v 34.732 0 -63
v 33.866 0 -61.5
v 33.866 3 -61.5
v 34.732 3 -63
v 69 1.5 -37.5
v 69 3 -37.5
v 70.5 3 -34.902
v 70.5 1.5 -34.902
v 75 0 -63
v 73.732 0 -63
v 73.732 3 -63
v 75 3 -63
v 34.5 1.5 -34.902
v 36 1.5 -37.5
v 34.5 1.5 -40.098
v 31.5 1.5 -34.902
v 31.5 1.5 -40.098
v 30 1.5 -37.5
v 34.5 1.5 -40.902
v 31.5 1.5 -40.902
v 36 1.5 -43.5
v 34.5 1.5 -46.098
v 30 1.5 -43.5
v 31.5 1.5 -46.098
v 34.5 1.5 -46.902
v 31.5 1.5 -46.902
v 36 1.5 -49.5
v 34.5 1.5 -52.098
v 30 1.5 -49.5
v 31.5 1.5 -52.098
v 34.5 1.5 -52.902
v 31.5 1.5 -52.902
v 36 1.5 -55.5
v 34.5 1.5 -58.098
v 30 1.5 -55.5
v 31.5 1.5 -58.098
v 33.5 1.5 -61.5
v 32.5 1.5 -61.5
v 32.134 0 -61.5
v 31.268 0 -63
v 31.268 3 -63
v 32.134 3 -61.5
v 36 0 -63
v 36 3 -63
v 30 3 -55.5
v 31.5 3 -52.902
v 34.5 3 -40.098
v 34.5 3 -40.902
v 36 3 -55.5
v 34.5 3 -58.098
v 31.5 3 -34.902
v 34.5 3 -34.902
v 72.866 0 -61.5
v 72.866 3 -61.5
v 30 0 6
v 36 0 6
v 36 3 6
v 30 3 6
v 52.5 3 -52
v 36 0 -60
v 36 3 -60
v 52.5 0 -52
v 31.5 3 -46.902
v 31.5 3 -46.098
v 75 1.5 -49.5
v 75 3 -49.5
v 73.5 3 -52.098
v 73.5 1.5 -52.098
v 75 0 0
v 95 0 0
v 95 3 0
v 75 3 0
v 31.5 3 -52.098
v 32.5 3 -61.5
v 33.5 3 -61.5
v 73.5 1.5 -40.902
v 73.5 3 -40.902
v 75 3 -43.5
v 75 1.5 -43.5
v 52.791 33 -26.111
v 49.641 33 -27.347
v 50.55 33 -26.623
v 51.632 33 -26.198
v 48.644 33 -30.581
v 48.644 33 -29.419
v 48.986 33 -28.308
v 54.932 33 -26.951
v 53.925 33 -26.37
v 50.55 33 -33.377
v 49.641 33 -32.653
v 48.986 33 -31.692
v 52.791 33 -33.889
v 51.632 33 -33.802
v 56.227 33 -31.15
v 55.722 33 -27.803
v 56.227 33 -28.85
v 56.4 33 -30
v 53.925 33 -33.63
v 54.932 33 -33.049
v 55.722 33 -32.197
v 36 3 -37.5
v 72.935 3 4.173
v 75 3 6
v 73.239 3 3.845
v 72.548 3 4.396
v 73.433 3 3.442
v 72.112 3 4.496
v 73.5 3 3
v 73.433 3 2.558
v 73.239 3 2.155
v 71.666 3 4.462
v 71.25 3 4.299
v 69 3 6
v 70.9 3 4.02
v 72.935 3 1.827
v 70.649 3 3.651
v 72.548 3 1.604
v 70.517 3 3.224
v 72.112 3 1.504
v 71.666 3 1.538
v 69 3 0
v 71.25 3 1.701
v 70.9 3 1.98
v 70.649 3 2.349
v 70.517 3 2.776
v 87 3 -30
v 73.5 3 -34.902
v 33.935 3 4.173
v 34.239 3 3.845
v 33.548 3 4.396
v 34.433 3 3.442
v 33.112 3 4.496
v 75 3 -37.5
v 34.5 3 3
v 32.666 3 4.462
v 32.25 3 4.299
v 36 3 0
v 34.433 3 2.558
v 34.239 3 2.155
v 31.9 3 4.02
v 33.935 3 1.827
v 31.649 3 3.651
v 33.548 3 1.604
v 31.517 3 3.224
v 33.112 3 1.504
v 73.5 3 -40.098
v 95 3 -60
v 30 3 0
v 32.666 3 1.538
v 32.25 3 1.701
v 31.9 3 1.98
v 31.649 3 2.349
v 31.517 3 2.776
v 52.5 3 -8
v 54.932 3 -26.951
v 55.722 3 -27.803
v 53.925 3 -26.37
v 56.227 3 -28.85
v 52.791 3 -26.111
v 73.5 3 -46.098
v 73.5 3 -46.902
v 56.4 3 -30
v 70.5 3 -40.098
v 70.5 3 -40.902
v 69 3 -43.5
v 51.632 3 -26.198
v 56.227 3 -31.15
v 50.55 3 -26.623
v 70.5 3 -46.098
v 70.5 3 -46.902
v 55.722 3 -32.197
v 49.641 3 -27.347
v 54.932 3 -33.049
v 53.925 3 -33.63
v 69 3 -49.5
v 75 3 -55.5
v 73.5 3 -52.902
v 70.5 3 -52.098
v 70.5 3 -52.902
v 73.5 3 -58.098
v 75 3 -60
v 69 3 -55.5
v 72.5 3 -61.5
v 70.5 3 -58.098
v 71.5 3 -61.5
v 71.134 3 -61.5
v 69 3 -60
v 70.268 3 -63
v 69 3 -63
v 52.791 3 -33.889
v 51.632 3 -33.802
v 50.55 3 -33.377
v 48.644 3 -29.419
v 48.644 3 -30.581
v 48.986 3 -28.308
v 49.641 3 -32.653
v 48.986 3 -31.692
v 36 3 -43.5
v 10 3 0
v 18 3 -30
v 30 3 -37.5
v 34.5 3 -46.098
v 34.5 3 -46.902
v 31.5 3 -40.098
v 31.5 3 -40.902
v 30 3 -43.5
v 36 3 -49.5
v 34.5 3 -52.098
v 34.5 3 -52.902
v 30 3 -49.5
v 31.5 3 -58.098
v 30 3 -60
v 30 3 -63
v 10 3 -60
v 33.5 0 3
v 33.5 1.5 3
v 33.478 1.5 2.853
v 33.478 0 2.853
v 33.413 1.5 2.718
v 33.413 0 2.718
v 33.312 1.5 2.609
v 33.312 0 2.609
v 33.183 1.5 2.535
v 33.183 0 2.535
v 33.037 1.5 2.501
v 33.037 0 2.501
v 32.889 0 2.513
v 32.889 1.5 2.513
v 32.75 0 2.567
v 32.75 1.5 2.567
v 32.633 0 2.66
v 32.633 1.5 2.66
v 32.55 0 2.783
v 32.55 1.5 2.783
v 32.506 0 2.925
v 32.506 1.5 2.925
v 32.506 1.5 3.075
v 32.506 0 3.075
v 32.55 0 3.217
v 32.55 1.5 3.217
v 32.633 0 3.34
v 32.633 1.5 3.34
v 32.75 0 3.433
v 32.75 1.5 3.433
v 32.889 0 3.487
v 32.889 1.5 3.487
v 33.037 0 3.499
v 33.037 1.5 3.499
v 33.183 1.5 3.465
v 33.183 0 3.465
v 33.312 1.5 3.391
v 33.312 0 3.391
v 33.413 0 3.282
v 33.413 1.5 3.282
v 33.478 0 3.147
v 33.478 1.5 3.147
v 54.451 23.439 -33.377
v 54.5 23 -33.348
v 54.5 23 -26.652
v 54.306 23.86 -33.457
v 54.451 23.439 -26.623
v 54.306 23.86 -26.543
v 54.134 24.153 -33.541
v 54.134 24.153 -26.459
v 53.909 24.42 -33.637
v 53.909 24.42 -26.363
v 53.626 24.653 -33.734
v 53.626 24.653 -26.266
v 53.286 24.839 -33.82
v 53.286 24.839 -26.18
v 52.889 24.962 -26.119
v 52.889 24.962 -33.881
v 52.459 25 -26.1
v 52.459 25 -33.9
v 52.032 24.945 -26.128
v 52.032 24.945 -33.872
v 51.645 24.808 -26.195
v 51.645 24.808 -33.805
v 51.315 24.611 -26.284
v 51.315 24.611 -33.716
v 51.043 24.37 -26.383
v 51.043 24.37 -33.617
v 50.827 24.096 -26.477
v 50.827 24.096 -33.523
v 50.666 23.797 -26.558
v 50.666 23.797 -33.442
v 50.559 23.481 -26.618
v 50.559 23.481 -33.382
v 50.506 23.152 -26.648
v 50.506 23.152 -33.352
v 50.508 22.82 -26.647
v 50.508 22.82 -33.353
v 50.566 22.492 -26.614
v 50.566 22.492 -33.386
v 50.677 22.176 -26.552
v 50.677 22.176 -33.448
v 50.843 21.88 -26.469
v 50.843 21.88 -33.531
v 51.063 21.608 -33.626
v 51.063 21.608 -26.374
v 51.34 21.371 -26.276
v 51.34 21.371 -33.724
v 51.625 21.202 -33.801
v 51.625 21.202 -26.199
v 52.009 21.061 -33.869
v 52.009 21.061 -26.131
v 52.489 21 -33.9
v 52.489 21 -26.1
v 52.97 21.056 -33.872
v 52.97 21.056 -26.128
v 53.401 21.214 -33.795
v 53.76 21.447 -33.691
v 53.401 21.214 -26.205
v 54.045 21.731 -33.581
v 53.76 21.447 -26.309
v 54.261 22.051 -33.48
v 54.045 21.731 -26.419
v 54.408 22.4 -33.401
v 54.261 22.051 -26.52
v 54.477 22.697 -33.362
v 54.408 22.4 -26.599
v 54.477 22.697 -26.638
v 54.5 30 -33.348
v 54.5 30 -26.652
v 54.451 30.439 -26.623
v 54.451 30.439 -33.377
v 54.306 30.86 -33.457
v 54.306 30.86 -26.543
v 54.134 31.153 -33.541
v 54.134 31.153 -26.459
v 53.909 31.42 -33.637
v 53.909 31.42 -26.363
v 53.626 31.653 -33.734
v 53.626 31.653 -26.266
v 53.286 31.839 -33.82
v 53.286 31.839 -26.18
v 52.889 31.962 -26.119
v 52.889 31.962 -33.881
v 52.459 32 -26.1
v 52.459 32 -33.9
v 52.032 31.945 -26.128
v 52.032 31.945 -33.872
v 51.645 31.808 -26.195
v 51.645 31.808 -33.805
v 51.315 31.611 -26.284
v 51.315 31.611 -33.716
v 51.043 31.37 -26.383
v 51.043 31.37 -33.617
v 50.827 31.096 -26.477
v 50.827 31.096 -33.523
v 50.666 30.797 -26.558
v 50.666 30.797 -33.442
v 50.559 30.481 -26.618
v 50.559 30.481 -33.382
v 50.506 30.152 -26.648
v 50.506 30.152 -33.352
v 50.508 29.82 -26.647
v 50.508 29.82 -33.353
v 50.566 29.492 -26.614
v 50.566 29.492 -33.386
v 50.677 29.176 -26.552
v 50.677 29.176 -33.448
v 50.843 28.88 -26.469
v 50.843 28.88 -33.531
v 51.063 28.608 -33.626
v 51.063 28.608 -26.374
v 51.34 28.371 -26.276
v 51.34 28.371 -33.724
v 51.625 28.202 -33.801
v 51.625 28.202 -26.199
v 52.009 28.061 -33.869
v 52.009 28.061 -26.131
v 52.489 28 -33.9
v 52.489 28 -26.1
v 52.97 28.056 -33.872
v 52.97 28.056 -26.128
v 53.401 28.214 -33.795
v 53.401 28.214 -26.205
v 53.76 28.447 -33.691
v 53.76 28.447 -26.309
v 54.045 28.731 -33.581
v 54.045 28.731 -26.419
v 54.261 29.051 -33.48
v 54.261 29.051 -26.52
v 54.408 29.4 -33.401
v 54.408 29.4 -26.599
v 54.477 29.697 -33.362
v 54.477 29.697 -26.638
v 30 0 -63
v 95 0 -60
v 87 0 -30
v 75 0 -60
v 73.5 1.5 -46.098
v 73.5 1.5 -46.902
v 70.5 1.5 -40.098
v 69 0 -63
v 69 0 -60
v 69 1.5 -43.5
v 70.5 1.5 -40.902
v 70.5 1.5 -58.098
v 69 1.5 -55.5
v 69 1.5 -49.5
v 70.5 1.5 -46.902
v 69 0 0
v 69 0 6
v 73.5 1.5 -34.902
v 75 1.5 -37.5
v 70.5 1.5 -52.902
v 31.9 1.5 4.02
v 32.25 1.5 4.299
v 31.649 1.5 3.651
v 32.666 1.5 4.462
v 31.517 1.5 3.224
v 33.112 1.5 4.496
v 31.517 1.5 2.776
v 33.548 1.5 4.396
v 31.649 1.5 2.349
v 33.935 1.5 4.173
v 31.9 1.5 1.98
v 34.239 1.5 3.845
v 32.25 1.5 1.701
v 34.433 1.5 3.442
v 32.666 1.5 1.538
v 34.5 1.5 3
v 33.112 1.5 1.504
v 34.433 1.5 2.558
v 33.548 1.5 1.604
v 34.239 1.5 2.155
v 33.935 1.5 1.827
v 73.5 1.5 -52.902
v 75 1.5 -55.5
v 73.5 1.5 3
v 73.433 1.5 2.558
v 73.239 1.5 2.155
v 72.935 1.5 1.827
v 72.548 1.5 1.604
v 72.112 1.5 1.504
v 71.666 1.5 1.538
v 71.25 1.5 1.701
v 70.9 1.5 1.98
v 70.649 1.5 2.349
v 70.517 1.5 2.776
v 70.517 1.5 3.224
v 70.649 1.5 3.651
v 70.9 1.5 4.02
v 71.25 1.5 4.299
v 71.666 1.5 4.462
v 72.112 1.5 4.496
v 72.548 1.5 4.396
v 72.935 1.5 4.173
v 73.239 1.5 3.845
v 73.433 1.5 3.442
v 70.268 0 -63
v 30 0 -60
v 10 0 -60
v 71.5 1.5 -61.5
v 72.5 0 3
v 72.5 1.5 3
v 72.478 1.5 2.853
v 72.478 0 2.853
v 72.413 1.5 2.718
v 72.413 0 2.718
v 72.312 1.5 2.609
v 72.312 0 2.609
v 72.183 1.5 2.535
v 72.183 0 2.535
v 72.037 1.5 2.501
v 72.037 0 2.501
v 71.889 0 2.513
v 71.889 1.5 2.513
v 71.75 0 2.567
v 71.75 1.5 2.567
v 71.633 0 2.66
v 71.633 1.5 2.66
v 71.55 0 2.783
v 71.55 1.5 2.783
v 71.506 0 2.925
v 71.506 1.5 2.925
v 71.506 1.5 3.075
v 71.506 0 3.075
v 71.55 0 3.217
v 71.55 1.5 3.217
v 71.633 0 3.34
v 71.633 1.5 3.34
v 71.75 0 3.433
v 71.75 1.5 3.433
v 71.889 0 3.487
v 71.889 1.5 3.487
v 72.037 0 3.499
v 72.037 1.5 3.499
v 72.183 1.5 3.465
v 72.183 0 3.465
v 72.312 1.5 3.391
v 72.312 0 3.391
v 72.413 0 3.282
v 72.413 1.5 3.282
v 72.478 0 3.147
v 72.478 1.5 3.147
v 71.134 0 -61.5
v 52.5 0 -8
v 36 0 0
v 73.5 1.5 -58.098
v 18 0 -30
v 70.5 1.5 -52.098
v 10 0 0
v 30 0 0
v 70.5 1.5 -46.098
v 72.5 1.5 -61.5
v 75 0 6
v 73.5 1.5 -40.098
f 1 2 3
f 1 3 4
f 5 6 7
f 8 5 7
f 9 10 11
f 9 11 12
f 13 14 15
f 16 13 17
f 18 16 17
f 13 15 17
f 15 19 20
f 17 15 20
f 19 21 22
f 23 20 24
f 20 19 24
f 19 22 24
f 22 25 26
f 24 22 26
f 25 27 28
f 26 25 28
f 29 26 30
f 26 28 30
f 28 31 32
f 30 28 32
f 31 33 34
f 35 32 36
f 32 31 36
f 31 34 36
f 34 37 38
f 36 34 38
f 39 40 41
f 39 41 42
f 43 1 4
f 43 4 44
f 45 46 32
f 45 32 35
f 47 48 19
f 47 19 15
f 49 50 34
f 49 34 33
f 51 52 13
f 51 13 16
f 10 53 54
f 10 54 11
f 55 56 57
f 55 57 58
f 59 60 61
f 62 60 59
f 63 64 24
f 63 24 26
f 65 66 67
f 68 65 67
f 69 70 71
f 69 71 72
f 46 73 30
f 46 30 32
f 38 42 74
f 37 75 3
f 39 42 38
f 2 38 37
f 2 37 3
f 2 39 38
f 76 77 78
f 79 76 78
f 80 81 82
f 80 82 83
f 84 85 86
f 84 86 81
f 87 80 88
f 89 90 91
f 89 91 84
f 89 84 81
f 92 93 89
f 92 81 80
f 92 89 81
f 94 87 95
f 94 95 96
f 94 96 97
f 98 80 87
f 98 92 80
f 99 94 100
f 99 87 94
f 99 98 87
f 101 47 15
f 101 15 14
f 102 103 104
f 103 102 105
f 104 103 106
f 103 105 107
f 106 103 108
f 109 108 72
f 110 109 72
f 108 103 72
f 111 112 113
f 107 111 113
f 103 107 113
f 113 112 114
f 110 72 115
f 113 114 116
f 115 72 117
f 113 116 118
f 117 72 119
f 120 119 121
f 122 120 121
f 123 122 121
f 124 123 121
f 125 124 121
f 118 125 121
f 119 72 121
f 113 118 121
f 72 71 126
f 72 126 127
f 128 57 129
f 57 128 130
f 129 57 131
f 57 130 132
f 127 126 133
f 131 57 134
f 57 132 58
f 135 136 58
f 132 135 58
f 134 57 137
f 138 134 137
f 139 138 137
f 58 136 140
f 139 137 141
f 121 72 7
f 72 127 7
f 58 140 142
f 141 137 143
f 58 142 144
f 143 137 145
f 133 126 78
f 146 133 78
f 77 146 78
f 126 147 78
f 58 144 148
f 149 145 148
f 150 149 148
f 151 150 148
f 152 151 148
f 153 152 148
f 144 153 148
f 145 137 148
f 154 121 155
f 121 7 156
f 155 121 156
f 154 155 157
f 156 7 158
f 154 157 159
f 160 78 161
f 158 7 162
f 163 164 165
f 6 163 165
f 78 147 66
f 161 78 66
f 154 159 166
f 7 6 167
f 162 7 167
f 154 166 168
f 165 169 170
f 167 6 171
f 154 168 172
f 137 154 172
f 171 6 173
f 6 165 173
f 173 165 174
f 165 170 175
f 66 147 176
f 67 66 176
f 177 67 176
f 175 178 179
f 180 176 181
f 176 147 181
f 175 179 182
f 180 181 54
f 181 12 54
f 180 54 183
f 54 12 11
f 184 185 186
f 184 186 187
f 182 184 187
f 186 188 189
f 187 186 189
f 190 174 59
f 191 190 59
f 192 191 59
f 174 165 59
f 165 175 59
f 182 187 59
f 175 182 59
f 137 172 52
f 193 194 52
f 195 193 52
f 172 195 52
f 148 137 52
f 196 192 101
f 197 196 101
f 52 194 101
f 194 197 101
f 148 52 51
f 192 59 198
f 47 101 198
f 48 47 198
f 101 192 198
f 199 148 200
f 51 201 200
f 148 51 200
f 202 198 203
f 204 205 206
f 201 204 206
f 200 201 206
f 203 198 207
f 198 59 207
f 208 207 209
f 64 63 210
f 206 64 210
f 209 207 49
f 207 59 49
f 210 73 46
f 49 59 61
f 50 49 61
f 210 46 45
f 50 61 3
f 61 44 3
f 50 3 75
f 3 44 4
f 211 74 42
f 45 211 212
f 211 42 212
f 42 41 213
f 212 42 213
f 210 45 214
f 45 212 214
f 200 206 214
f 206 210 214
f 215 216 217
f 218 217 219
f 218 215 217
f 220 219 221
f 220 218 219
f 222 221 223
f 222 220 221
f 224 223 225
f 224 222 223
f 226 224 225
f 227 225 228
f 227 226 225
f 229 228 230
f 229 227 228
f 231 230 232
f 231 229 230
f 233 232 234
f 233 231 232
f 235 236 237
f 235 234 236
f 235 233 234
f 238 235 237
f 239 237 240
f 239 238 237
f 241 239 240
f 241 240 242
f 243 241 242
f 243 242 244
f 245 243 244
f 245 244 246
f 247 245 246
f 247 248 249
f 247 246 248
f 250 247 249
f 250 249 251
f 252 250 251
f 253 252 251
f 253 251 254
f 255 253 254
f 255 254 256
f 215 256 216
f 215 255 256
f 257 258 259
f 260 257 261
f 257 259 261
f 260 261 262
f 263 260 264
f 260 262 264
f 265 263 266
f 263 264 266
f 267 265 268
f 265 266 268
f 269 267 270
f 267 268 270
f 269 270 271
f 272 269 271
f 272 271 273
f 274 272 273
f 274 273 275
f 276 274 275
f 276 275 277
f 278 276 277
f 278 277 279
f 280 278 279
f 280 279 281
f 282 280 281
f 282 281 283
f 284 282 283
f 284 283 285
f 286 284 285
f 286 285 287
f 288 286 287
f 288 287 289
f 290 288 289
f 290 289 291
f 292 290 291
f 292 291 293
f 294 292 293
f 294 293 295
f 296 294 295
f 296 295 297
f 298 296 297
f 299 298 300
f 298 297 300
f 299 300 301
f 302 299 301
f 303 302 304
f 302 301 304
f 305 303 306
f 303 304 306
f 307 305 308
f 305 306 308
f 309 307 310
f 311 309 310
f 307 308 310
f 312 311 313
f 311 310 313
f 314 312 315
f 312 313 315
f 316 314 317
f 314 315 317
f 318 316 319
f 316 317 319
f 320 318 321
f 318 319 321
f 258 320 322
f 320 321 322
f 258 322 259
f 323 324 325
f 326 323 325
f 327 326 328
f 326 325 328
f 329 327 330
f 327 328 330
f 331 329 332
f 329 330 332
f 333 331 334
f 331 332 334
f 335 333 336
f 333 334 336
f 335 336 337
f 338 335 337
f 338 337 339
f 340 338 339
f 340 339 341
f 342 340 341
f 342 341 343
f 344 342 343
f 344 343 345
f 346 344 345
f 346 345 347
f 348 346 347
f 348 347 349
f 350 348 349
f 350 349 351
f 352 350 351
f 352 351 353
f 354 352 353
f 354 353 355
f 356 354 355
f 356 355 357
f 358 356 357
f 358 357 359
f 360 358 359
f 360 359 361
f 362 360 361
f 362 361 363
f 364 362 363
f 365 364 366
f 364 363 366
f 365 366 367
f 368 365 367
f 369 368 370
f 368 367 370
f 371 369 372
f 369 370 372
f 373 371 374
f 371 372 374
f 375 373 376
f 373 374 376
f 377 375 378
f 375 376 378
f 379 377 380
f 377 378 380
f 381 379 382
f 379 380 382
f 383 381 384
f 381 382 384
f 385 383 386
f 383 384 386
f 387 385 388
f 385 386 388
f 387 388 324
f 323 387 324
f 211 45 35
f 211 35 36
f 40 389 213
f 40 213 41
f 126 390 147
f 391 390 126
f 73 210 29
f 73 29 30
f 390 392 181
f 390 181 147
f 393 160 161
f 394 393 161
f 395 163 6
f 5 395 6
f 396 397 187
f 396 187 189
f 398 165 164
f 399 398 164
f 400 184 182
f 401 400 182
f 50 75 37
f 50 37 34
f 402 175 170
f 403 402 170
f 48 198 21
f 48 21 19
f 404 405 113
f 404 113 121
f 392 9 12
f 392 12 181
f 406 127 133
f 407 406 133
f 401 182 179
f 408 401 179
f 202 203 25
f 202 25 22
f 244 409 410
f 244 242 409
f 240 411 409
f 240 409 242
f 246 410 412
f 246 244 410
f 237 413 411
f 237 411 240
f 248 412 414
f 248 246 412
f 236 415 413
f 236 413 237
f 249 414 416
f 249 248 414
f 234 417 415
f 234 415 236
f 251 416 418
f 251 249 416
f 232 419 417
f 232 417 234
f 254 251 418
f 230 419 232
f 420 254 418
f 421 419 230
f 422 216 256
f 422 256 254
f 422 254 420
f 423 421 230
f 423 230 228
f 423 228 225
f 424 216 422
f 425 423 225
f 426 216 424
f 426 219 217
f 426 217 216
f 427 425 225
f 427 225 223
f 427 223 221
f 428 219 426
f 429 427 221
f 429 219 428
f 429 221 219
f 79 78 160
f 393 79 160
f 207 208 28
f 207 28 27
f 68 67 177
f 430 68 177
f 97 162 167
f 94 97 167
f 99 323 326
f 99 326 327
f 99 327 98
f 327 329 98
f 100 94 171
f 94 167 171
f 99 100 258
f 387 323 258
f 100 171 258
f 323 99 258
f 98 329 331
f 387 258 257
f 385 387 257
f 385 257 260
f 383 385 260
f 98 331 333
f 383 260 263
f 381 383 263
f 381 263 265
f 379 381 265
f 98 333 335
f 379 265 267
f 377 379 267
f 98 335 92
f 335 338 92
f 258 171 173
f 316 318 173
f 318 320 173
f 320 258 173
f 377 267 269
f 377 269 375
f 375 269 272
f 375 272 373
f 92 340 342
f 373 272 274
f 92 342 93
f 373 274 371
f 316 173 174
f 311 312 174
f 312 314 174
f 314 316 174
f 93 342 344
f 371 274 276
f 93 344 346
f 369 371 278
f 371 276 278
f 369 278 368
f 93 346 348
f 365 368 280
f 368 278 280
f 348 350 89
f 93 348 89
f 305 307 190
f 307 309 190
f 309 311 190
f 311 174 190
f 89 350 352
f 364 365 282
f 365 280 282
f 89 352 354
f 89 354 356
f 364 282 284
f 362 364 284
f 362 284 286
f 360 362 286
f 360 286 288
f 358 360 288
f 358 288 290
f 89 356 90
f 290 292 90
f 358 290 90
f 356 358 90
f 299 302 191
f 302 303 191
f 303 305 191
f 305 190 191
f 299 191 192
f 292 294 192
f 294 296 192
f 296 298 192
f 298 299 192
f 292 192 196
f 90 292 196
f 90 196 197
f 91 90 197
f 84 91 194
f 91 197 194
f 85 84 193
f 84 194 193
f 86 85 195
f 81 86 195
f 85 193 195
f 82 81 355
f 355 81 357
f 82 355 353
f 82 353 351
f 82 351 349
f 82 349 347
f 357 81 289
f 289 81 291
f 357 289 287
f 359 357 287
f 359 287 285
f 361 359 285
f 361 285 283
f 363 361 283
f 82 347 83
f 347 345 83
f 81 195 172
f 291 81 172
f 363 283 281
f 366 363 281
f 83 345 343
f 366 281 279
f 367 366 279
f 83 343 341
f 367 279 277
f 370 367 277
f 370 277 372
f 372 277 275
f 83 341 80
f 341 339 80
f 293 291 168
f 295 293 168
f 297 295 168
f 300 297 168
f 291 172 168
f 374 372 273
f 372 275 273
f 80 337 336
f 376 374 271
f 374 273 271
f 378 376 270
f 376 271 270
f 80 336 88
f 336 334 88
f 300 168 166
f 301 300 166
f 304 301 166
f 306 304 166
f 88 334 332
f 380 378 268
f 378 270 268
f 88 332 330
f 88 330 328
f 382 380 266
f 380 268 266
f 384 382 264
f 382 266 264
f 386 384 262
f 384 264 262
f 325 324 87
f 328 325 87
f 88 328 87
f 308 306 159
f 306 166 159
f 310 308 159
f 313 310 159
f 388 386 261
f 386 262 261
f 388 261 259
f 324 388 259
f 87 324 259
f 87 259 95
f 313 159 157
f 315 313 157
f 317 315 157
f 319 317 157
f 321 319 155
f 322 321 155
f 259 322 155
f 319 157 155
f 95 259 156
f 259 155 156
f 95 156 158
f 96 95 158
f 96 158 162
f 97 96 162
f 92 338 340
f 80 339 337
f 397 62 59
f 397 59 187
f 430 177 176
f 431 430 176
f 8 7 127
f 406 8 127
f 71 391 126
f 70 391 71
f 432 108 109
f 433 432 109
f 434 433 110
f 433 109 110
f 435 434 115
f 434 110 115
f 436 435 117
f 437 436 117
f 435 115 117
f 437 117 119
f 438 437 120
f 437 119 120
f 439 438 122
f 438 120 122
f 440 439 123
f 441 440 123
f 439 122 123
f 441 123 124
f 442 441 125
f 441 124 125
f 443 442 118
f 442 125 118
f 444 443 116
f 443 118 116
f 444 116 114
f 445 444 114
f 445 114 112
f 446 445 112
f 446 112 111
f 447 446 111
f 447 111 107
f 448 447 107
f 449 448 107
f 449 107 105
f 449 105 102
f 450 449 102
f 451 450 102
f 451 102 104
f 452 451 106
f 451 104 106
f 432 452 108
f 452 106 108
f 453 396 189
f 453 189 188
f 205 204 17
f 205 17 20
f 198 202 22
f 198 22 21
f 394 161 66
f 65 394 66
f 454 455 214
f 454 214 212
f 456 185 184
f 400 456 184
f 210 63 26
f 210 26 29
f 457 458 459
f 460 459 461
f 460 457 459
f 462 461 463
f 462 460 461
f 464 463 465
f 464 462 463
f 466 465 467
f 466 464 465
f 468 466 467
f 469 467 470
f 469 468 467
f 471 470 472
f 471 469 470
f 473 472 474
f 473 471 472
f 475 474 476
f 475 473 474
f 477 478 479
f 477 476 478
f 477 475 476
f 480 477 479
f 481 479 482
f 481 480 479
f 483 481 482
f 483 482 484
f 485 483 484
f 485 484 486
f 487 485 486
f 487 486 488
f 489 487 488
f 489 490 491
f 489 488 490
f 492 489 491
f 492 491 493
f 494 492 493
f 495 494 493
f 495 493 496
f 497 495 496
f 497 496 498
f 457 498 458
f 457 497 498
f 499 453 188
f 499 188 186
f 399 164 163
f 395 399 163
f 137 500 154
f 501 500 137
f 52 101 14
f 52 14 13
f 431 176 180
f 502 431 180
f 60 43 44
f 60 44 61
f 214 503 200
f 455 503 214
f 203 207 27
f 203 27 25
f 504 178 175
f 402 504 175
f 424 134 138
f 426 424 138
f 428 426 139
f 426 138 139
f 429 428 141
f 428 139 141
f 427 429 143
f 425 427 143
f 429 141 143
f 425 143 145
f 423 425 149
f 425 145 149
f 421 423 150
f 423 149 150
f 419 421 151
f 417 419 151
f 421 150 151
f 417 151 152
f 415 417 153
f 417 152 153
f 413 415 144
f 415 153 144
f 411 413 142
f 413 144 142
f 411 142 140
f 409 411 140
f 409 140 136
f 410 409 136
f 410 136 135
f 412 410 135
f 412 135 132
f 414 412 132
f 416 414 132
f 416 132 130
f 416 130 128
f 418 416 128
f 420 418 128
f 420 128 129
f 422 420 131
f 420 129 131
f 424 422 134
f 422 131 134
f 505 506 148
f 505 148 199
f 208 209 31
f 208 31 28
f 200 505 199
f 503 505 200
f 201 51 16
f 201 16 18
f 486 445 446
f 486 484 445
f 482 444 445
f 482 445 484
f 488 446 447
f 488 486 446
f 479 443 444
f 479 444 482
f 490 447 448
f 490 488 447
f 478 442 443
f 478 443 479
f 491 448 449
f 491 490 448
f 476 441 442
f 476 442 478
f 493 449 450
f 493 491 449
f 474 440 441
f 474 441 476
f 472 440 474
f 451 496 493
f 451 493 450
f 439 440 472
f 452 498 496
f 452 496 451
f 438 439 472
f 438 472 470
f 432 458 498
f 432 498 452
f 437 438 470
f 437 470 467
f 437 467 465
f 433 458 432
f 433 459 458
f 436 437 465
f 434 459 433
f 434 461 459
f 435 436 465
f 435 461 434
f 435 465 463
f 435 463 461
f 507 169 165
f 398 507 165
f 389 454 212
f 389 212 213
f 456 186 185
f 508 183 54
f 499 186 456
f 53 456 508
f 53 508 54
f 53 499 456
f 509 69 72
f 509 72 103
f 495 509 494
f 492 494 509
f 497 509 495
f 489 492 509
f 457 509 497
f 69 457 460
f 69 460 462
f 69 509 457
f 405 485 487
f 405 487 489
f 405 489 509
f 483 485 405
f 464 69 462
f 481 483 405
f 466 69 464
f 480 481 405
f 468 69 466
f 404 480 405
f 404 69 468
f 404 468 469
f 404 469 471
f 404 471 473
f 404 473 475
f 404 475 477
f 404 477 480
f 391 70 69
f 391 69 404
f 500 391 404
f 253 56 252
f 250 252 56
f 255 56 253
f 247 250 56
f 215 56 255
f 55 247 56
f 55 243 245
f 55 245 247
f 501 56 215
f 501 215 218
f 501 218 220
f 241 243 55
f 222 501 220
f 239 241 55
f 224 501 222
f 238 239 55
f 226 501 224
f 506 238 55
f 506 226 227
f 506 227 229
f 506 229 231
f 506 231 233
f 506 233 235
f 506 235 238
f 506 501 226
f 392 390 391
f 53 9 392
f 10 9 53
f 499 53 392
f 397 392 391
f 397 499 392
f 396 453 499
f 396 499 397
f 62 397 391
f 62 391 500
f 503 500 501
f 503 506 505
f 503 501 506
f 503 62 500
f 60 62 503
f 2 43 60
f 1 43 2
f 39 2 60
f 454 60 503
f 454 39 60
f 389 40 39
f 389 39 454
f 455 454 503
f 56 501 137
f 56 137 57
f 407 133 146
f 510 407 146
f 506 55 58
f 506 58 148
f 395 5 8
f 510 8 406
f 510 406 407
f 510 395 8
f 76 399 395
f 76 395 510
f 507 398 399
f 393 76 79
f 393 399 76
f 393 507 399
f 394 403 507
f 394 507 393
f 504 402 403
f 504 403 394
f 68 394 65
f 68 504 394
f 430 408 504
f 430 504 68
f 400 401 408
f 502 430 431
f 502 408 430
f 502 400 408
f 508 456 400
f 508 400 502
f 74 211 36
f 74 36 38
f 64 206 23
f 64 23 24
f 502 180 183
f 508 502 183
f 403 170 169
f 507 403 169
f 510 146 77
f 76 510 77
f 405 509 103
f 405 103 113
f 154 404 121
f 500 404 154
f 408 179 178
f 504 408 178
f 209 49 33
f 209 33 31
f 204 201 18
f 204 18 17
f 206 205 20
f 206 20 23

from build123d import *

# Parameters (mm, degrees)
CROQUIS1_R              = 0.5
SALIENTE_EXTRUIR1_DEPTH = 3
CROQUIS2_R              = 3.9
SALIENTE_EXTRUIR2_DEPTH = 30
CROQUIS3_R              = 2
CORTAR_EXTRUIR1_DEPTH   = 64
CROQUIS4_R              = 1.5
CORTAR_EXTRUIR2_DEPTH   = 1.5
CORTAR_EXTRUIR3_DEPTH   = 1.5


with BuildPart() as part:
    # Croquis1 → Saliente-Extruir1 (new body)
    with BuildSketch(Plane(origin=(0, 0, 0), x_dir=(1, 0, 0), z_dir=(0, 1, 0))):
        Polygon((30, 60), (30, 63), (31.267949192, 63), (32.133974596, 61.5), (33.866025404, 61.5), (34.732050808, 63), (36, 63), (36, 60), (52.5, 52), (69, 60), (69, 63), (70.267949192, 63), (71.133974596, 61.5), (72.866025404, 61.5), (73.732050808, 63), (75, 63), (75, 60), (95, 60), (87, 30), (95, 0), (75, 0), (75, -6), (69, -6), (69, 0), (52.5, 8), (36, 0), (36, -6), (30, -6), (30, 0), (10, 0), (18, 30), (10, 60), align=None)
        with Locations((33, -3)):
            Circle(CROQUIS1_R, mode=Mode.SUBTRACT)
        with Locations((72, -3)):
            Circle(CROQUIS1_R, mode=Mode.SUBTRACT)
    extrude(amount=SALIENTE_EXTRUIR1_DEPTH)

    # Croquis2 → Saliente-Extruir2 (add)
    with BuildSketch(Plane(origin=(0, 3, 0), x_dir=(1, 0, 0), z_dir=(0, 1, 0))):
        with Locations((52.5, 30)):
            Circle(CROQUIS2_R)
    extrude(amount=SALIENTE_EXTRUIR2_DEPTH)

    # Croquis3 → Cortar-Extruir1 (cut, through all)
    with BuildSketch(Plane.XY):
        with Locations((52.5, 30)):
            Circle(CROQUIS3_R)
        with Locations((52.5, 23)):
            Circle(CROQUIS3_R)
    extrude(amount=-CORTAR_EXTRUIR1_DEPTH, mode=Mode.SUBTRACT)

    # Croquis4 → Cortar-Extruir2 (cut)
    with BuildSketch(Plane(origin=(0, 3, 0), x_dir=(1, 0, 0), z_dir=(0, 1, 0))):
        with Locations((33, -3)):
            Circle(CROQUIS4_R)
        with Locations((72, -3)):
            Circle(CROQUIS4_R)
    extrude(amount=-CORTAR_EXTRUIR2_DEPTH, mode=Mode.SUBTRACT)

    # Croquis5 → Cortar-Extruir3 (cut)
    with BuildSketch(Plane(origin=(0, 3, 0), x_dir=(1, 0, 0), z_dir=(0, 1, 0))):
        Polygon((32.5, 61.5), (33.5, 61.5), (34.5, 58.098076211), (36, 55.5), (34.5, 52.901923789), (34.5, 52.098076211), (36, 49.5), (34.5, 46.901923789), (34.5, 46.098076211), (36, 43.5), (34.5, 40.901923789), (34.5, 40.098076211), (36, 37.5), (34.5, 34.901923789), (31.5, 34.901923789), (30, 37.5), (31.5, 40.098076211), (31.5, 40.901923789), (30, 43.5), (31.5, 46.098076211), (31.5, 46.901923789), (30, 49.5), (31.5, 52.098076211), (31.5, 52.901923789), (30, 55.5), (31.5, 58.098076211), align=None)
        Polygon((71.5, 61.5), (70.5, 58.098076211), (69, 55.5), (70.5, 52.901923789), (70.5, 52.098076211), (69, 49.5), (70.5, 46.901923789), (70.5, 46.098076211), (69, 43.5), (70.5, 40.901923789), (70.5, 40.098076211), (69, 37.5), (70.5, 34.901923789), (73.5, 34.901923789), (75, 37.5), (73.5, 40.098076211), (73.5, 40.901923789), (75, 43.5), (73.5, 46.098076211), (73.5, 46.901923789), (75, 49.5), (73.5, 52.098076211), (73.5, 52.901923789), (75, 55.5), (73.5, 58.098076211), (72.5, 61.5), align=None)
    extrude(amount=-CORTAR_EXTRUIR3_DEPTH, mode=Mode.SUBTRACT)


solid = part.part
